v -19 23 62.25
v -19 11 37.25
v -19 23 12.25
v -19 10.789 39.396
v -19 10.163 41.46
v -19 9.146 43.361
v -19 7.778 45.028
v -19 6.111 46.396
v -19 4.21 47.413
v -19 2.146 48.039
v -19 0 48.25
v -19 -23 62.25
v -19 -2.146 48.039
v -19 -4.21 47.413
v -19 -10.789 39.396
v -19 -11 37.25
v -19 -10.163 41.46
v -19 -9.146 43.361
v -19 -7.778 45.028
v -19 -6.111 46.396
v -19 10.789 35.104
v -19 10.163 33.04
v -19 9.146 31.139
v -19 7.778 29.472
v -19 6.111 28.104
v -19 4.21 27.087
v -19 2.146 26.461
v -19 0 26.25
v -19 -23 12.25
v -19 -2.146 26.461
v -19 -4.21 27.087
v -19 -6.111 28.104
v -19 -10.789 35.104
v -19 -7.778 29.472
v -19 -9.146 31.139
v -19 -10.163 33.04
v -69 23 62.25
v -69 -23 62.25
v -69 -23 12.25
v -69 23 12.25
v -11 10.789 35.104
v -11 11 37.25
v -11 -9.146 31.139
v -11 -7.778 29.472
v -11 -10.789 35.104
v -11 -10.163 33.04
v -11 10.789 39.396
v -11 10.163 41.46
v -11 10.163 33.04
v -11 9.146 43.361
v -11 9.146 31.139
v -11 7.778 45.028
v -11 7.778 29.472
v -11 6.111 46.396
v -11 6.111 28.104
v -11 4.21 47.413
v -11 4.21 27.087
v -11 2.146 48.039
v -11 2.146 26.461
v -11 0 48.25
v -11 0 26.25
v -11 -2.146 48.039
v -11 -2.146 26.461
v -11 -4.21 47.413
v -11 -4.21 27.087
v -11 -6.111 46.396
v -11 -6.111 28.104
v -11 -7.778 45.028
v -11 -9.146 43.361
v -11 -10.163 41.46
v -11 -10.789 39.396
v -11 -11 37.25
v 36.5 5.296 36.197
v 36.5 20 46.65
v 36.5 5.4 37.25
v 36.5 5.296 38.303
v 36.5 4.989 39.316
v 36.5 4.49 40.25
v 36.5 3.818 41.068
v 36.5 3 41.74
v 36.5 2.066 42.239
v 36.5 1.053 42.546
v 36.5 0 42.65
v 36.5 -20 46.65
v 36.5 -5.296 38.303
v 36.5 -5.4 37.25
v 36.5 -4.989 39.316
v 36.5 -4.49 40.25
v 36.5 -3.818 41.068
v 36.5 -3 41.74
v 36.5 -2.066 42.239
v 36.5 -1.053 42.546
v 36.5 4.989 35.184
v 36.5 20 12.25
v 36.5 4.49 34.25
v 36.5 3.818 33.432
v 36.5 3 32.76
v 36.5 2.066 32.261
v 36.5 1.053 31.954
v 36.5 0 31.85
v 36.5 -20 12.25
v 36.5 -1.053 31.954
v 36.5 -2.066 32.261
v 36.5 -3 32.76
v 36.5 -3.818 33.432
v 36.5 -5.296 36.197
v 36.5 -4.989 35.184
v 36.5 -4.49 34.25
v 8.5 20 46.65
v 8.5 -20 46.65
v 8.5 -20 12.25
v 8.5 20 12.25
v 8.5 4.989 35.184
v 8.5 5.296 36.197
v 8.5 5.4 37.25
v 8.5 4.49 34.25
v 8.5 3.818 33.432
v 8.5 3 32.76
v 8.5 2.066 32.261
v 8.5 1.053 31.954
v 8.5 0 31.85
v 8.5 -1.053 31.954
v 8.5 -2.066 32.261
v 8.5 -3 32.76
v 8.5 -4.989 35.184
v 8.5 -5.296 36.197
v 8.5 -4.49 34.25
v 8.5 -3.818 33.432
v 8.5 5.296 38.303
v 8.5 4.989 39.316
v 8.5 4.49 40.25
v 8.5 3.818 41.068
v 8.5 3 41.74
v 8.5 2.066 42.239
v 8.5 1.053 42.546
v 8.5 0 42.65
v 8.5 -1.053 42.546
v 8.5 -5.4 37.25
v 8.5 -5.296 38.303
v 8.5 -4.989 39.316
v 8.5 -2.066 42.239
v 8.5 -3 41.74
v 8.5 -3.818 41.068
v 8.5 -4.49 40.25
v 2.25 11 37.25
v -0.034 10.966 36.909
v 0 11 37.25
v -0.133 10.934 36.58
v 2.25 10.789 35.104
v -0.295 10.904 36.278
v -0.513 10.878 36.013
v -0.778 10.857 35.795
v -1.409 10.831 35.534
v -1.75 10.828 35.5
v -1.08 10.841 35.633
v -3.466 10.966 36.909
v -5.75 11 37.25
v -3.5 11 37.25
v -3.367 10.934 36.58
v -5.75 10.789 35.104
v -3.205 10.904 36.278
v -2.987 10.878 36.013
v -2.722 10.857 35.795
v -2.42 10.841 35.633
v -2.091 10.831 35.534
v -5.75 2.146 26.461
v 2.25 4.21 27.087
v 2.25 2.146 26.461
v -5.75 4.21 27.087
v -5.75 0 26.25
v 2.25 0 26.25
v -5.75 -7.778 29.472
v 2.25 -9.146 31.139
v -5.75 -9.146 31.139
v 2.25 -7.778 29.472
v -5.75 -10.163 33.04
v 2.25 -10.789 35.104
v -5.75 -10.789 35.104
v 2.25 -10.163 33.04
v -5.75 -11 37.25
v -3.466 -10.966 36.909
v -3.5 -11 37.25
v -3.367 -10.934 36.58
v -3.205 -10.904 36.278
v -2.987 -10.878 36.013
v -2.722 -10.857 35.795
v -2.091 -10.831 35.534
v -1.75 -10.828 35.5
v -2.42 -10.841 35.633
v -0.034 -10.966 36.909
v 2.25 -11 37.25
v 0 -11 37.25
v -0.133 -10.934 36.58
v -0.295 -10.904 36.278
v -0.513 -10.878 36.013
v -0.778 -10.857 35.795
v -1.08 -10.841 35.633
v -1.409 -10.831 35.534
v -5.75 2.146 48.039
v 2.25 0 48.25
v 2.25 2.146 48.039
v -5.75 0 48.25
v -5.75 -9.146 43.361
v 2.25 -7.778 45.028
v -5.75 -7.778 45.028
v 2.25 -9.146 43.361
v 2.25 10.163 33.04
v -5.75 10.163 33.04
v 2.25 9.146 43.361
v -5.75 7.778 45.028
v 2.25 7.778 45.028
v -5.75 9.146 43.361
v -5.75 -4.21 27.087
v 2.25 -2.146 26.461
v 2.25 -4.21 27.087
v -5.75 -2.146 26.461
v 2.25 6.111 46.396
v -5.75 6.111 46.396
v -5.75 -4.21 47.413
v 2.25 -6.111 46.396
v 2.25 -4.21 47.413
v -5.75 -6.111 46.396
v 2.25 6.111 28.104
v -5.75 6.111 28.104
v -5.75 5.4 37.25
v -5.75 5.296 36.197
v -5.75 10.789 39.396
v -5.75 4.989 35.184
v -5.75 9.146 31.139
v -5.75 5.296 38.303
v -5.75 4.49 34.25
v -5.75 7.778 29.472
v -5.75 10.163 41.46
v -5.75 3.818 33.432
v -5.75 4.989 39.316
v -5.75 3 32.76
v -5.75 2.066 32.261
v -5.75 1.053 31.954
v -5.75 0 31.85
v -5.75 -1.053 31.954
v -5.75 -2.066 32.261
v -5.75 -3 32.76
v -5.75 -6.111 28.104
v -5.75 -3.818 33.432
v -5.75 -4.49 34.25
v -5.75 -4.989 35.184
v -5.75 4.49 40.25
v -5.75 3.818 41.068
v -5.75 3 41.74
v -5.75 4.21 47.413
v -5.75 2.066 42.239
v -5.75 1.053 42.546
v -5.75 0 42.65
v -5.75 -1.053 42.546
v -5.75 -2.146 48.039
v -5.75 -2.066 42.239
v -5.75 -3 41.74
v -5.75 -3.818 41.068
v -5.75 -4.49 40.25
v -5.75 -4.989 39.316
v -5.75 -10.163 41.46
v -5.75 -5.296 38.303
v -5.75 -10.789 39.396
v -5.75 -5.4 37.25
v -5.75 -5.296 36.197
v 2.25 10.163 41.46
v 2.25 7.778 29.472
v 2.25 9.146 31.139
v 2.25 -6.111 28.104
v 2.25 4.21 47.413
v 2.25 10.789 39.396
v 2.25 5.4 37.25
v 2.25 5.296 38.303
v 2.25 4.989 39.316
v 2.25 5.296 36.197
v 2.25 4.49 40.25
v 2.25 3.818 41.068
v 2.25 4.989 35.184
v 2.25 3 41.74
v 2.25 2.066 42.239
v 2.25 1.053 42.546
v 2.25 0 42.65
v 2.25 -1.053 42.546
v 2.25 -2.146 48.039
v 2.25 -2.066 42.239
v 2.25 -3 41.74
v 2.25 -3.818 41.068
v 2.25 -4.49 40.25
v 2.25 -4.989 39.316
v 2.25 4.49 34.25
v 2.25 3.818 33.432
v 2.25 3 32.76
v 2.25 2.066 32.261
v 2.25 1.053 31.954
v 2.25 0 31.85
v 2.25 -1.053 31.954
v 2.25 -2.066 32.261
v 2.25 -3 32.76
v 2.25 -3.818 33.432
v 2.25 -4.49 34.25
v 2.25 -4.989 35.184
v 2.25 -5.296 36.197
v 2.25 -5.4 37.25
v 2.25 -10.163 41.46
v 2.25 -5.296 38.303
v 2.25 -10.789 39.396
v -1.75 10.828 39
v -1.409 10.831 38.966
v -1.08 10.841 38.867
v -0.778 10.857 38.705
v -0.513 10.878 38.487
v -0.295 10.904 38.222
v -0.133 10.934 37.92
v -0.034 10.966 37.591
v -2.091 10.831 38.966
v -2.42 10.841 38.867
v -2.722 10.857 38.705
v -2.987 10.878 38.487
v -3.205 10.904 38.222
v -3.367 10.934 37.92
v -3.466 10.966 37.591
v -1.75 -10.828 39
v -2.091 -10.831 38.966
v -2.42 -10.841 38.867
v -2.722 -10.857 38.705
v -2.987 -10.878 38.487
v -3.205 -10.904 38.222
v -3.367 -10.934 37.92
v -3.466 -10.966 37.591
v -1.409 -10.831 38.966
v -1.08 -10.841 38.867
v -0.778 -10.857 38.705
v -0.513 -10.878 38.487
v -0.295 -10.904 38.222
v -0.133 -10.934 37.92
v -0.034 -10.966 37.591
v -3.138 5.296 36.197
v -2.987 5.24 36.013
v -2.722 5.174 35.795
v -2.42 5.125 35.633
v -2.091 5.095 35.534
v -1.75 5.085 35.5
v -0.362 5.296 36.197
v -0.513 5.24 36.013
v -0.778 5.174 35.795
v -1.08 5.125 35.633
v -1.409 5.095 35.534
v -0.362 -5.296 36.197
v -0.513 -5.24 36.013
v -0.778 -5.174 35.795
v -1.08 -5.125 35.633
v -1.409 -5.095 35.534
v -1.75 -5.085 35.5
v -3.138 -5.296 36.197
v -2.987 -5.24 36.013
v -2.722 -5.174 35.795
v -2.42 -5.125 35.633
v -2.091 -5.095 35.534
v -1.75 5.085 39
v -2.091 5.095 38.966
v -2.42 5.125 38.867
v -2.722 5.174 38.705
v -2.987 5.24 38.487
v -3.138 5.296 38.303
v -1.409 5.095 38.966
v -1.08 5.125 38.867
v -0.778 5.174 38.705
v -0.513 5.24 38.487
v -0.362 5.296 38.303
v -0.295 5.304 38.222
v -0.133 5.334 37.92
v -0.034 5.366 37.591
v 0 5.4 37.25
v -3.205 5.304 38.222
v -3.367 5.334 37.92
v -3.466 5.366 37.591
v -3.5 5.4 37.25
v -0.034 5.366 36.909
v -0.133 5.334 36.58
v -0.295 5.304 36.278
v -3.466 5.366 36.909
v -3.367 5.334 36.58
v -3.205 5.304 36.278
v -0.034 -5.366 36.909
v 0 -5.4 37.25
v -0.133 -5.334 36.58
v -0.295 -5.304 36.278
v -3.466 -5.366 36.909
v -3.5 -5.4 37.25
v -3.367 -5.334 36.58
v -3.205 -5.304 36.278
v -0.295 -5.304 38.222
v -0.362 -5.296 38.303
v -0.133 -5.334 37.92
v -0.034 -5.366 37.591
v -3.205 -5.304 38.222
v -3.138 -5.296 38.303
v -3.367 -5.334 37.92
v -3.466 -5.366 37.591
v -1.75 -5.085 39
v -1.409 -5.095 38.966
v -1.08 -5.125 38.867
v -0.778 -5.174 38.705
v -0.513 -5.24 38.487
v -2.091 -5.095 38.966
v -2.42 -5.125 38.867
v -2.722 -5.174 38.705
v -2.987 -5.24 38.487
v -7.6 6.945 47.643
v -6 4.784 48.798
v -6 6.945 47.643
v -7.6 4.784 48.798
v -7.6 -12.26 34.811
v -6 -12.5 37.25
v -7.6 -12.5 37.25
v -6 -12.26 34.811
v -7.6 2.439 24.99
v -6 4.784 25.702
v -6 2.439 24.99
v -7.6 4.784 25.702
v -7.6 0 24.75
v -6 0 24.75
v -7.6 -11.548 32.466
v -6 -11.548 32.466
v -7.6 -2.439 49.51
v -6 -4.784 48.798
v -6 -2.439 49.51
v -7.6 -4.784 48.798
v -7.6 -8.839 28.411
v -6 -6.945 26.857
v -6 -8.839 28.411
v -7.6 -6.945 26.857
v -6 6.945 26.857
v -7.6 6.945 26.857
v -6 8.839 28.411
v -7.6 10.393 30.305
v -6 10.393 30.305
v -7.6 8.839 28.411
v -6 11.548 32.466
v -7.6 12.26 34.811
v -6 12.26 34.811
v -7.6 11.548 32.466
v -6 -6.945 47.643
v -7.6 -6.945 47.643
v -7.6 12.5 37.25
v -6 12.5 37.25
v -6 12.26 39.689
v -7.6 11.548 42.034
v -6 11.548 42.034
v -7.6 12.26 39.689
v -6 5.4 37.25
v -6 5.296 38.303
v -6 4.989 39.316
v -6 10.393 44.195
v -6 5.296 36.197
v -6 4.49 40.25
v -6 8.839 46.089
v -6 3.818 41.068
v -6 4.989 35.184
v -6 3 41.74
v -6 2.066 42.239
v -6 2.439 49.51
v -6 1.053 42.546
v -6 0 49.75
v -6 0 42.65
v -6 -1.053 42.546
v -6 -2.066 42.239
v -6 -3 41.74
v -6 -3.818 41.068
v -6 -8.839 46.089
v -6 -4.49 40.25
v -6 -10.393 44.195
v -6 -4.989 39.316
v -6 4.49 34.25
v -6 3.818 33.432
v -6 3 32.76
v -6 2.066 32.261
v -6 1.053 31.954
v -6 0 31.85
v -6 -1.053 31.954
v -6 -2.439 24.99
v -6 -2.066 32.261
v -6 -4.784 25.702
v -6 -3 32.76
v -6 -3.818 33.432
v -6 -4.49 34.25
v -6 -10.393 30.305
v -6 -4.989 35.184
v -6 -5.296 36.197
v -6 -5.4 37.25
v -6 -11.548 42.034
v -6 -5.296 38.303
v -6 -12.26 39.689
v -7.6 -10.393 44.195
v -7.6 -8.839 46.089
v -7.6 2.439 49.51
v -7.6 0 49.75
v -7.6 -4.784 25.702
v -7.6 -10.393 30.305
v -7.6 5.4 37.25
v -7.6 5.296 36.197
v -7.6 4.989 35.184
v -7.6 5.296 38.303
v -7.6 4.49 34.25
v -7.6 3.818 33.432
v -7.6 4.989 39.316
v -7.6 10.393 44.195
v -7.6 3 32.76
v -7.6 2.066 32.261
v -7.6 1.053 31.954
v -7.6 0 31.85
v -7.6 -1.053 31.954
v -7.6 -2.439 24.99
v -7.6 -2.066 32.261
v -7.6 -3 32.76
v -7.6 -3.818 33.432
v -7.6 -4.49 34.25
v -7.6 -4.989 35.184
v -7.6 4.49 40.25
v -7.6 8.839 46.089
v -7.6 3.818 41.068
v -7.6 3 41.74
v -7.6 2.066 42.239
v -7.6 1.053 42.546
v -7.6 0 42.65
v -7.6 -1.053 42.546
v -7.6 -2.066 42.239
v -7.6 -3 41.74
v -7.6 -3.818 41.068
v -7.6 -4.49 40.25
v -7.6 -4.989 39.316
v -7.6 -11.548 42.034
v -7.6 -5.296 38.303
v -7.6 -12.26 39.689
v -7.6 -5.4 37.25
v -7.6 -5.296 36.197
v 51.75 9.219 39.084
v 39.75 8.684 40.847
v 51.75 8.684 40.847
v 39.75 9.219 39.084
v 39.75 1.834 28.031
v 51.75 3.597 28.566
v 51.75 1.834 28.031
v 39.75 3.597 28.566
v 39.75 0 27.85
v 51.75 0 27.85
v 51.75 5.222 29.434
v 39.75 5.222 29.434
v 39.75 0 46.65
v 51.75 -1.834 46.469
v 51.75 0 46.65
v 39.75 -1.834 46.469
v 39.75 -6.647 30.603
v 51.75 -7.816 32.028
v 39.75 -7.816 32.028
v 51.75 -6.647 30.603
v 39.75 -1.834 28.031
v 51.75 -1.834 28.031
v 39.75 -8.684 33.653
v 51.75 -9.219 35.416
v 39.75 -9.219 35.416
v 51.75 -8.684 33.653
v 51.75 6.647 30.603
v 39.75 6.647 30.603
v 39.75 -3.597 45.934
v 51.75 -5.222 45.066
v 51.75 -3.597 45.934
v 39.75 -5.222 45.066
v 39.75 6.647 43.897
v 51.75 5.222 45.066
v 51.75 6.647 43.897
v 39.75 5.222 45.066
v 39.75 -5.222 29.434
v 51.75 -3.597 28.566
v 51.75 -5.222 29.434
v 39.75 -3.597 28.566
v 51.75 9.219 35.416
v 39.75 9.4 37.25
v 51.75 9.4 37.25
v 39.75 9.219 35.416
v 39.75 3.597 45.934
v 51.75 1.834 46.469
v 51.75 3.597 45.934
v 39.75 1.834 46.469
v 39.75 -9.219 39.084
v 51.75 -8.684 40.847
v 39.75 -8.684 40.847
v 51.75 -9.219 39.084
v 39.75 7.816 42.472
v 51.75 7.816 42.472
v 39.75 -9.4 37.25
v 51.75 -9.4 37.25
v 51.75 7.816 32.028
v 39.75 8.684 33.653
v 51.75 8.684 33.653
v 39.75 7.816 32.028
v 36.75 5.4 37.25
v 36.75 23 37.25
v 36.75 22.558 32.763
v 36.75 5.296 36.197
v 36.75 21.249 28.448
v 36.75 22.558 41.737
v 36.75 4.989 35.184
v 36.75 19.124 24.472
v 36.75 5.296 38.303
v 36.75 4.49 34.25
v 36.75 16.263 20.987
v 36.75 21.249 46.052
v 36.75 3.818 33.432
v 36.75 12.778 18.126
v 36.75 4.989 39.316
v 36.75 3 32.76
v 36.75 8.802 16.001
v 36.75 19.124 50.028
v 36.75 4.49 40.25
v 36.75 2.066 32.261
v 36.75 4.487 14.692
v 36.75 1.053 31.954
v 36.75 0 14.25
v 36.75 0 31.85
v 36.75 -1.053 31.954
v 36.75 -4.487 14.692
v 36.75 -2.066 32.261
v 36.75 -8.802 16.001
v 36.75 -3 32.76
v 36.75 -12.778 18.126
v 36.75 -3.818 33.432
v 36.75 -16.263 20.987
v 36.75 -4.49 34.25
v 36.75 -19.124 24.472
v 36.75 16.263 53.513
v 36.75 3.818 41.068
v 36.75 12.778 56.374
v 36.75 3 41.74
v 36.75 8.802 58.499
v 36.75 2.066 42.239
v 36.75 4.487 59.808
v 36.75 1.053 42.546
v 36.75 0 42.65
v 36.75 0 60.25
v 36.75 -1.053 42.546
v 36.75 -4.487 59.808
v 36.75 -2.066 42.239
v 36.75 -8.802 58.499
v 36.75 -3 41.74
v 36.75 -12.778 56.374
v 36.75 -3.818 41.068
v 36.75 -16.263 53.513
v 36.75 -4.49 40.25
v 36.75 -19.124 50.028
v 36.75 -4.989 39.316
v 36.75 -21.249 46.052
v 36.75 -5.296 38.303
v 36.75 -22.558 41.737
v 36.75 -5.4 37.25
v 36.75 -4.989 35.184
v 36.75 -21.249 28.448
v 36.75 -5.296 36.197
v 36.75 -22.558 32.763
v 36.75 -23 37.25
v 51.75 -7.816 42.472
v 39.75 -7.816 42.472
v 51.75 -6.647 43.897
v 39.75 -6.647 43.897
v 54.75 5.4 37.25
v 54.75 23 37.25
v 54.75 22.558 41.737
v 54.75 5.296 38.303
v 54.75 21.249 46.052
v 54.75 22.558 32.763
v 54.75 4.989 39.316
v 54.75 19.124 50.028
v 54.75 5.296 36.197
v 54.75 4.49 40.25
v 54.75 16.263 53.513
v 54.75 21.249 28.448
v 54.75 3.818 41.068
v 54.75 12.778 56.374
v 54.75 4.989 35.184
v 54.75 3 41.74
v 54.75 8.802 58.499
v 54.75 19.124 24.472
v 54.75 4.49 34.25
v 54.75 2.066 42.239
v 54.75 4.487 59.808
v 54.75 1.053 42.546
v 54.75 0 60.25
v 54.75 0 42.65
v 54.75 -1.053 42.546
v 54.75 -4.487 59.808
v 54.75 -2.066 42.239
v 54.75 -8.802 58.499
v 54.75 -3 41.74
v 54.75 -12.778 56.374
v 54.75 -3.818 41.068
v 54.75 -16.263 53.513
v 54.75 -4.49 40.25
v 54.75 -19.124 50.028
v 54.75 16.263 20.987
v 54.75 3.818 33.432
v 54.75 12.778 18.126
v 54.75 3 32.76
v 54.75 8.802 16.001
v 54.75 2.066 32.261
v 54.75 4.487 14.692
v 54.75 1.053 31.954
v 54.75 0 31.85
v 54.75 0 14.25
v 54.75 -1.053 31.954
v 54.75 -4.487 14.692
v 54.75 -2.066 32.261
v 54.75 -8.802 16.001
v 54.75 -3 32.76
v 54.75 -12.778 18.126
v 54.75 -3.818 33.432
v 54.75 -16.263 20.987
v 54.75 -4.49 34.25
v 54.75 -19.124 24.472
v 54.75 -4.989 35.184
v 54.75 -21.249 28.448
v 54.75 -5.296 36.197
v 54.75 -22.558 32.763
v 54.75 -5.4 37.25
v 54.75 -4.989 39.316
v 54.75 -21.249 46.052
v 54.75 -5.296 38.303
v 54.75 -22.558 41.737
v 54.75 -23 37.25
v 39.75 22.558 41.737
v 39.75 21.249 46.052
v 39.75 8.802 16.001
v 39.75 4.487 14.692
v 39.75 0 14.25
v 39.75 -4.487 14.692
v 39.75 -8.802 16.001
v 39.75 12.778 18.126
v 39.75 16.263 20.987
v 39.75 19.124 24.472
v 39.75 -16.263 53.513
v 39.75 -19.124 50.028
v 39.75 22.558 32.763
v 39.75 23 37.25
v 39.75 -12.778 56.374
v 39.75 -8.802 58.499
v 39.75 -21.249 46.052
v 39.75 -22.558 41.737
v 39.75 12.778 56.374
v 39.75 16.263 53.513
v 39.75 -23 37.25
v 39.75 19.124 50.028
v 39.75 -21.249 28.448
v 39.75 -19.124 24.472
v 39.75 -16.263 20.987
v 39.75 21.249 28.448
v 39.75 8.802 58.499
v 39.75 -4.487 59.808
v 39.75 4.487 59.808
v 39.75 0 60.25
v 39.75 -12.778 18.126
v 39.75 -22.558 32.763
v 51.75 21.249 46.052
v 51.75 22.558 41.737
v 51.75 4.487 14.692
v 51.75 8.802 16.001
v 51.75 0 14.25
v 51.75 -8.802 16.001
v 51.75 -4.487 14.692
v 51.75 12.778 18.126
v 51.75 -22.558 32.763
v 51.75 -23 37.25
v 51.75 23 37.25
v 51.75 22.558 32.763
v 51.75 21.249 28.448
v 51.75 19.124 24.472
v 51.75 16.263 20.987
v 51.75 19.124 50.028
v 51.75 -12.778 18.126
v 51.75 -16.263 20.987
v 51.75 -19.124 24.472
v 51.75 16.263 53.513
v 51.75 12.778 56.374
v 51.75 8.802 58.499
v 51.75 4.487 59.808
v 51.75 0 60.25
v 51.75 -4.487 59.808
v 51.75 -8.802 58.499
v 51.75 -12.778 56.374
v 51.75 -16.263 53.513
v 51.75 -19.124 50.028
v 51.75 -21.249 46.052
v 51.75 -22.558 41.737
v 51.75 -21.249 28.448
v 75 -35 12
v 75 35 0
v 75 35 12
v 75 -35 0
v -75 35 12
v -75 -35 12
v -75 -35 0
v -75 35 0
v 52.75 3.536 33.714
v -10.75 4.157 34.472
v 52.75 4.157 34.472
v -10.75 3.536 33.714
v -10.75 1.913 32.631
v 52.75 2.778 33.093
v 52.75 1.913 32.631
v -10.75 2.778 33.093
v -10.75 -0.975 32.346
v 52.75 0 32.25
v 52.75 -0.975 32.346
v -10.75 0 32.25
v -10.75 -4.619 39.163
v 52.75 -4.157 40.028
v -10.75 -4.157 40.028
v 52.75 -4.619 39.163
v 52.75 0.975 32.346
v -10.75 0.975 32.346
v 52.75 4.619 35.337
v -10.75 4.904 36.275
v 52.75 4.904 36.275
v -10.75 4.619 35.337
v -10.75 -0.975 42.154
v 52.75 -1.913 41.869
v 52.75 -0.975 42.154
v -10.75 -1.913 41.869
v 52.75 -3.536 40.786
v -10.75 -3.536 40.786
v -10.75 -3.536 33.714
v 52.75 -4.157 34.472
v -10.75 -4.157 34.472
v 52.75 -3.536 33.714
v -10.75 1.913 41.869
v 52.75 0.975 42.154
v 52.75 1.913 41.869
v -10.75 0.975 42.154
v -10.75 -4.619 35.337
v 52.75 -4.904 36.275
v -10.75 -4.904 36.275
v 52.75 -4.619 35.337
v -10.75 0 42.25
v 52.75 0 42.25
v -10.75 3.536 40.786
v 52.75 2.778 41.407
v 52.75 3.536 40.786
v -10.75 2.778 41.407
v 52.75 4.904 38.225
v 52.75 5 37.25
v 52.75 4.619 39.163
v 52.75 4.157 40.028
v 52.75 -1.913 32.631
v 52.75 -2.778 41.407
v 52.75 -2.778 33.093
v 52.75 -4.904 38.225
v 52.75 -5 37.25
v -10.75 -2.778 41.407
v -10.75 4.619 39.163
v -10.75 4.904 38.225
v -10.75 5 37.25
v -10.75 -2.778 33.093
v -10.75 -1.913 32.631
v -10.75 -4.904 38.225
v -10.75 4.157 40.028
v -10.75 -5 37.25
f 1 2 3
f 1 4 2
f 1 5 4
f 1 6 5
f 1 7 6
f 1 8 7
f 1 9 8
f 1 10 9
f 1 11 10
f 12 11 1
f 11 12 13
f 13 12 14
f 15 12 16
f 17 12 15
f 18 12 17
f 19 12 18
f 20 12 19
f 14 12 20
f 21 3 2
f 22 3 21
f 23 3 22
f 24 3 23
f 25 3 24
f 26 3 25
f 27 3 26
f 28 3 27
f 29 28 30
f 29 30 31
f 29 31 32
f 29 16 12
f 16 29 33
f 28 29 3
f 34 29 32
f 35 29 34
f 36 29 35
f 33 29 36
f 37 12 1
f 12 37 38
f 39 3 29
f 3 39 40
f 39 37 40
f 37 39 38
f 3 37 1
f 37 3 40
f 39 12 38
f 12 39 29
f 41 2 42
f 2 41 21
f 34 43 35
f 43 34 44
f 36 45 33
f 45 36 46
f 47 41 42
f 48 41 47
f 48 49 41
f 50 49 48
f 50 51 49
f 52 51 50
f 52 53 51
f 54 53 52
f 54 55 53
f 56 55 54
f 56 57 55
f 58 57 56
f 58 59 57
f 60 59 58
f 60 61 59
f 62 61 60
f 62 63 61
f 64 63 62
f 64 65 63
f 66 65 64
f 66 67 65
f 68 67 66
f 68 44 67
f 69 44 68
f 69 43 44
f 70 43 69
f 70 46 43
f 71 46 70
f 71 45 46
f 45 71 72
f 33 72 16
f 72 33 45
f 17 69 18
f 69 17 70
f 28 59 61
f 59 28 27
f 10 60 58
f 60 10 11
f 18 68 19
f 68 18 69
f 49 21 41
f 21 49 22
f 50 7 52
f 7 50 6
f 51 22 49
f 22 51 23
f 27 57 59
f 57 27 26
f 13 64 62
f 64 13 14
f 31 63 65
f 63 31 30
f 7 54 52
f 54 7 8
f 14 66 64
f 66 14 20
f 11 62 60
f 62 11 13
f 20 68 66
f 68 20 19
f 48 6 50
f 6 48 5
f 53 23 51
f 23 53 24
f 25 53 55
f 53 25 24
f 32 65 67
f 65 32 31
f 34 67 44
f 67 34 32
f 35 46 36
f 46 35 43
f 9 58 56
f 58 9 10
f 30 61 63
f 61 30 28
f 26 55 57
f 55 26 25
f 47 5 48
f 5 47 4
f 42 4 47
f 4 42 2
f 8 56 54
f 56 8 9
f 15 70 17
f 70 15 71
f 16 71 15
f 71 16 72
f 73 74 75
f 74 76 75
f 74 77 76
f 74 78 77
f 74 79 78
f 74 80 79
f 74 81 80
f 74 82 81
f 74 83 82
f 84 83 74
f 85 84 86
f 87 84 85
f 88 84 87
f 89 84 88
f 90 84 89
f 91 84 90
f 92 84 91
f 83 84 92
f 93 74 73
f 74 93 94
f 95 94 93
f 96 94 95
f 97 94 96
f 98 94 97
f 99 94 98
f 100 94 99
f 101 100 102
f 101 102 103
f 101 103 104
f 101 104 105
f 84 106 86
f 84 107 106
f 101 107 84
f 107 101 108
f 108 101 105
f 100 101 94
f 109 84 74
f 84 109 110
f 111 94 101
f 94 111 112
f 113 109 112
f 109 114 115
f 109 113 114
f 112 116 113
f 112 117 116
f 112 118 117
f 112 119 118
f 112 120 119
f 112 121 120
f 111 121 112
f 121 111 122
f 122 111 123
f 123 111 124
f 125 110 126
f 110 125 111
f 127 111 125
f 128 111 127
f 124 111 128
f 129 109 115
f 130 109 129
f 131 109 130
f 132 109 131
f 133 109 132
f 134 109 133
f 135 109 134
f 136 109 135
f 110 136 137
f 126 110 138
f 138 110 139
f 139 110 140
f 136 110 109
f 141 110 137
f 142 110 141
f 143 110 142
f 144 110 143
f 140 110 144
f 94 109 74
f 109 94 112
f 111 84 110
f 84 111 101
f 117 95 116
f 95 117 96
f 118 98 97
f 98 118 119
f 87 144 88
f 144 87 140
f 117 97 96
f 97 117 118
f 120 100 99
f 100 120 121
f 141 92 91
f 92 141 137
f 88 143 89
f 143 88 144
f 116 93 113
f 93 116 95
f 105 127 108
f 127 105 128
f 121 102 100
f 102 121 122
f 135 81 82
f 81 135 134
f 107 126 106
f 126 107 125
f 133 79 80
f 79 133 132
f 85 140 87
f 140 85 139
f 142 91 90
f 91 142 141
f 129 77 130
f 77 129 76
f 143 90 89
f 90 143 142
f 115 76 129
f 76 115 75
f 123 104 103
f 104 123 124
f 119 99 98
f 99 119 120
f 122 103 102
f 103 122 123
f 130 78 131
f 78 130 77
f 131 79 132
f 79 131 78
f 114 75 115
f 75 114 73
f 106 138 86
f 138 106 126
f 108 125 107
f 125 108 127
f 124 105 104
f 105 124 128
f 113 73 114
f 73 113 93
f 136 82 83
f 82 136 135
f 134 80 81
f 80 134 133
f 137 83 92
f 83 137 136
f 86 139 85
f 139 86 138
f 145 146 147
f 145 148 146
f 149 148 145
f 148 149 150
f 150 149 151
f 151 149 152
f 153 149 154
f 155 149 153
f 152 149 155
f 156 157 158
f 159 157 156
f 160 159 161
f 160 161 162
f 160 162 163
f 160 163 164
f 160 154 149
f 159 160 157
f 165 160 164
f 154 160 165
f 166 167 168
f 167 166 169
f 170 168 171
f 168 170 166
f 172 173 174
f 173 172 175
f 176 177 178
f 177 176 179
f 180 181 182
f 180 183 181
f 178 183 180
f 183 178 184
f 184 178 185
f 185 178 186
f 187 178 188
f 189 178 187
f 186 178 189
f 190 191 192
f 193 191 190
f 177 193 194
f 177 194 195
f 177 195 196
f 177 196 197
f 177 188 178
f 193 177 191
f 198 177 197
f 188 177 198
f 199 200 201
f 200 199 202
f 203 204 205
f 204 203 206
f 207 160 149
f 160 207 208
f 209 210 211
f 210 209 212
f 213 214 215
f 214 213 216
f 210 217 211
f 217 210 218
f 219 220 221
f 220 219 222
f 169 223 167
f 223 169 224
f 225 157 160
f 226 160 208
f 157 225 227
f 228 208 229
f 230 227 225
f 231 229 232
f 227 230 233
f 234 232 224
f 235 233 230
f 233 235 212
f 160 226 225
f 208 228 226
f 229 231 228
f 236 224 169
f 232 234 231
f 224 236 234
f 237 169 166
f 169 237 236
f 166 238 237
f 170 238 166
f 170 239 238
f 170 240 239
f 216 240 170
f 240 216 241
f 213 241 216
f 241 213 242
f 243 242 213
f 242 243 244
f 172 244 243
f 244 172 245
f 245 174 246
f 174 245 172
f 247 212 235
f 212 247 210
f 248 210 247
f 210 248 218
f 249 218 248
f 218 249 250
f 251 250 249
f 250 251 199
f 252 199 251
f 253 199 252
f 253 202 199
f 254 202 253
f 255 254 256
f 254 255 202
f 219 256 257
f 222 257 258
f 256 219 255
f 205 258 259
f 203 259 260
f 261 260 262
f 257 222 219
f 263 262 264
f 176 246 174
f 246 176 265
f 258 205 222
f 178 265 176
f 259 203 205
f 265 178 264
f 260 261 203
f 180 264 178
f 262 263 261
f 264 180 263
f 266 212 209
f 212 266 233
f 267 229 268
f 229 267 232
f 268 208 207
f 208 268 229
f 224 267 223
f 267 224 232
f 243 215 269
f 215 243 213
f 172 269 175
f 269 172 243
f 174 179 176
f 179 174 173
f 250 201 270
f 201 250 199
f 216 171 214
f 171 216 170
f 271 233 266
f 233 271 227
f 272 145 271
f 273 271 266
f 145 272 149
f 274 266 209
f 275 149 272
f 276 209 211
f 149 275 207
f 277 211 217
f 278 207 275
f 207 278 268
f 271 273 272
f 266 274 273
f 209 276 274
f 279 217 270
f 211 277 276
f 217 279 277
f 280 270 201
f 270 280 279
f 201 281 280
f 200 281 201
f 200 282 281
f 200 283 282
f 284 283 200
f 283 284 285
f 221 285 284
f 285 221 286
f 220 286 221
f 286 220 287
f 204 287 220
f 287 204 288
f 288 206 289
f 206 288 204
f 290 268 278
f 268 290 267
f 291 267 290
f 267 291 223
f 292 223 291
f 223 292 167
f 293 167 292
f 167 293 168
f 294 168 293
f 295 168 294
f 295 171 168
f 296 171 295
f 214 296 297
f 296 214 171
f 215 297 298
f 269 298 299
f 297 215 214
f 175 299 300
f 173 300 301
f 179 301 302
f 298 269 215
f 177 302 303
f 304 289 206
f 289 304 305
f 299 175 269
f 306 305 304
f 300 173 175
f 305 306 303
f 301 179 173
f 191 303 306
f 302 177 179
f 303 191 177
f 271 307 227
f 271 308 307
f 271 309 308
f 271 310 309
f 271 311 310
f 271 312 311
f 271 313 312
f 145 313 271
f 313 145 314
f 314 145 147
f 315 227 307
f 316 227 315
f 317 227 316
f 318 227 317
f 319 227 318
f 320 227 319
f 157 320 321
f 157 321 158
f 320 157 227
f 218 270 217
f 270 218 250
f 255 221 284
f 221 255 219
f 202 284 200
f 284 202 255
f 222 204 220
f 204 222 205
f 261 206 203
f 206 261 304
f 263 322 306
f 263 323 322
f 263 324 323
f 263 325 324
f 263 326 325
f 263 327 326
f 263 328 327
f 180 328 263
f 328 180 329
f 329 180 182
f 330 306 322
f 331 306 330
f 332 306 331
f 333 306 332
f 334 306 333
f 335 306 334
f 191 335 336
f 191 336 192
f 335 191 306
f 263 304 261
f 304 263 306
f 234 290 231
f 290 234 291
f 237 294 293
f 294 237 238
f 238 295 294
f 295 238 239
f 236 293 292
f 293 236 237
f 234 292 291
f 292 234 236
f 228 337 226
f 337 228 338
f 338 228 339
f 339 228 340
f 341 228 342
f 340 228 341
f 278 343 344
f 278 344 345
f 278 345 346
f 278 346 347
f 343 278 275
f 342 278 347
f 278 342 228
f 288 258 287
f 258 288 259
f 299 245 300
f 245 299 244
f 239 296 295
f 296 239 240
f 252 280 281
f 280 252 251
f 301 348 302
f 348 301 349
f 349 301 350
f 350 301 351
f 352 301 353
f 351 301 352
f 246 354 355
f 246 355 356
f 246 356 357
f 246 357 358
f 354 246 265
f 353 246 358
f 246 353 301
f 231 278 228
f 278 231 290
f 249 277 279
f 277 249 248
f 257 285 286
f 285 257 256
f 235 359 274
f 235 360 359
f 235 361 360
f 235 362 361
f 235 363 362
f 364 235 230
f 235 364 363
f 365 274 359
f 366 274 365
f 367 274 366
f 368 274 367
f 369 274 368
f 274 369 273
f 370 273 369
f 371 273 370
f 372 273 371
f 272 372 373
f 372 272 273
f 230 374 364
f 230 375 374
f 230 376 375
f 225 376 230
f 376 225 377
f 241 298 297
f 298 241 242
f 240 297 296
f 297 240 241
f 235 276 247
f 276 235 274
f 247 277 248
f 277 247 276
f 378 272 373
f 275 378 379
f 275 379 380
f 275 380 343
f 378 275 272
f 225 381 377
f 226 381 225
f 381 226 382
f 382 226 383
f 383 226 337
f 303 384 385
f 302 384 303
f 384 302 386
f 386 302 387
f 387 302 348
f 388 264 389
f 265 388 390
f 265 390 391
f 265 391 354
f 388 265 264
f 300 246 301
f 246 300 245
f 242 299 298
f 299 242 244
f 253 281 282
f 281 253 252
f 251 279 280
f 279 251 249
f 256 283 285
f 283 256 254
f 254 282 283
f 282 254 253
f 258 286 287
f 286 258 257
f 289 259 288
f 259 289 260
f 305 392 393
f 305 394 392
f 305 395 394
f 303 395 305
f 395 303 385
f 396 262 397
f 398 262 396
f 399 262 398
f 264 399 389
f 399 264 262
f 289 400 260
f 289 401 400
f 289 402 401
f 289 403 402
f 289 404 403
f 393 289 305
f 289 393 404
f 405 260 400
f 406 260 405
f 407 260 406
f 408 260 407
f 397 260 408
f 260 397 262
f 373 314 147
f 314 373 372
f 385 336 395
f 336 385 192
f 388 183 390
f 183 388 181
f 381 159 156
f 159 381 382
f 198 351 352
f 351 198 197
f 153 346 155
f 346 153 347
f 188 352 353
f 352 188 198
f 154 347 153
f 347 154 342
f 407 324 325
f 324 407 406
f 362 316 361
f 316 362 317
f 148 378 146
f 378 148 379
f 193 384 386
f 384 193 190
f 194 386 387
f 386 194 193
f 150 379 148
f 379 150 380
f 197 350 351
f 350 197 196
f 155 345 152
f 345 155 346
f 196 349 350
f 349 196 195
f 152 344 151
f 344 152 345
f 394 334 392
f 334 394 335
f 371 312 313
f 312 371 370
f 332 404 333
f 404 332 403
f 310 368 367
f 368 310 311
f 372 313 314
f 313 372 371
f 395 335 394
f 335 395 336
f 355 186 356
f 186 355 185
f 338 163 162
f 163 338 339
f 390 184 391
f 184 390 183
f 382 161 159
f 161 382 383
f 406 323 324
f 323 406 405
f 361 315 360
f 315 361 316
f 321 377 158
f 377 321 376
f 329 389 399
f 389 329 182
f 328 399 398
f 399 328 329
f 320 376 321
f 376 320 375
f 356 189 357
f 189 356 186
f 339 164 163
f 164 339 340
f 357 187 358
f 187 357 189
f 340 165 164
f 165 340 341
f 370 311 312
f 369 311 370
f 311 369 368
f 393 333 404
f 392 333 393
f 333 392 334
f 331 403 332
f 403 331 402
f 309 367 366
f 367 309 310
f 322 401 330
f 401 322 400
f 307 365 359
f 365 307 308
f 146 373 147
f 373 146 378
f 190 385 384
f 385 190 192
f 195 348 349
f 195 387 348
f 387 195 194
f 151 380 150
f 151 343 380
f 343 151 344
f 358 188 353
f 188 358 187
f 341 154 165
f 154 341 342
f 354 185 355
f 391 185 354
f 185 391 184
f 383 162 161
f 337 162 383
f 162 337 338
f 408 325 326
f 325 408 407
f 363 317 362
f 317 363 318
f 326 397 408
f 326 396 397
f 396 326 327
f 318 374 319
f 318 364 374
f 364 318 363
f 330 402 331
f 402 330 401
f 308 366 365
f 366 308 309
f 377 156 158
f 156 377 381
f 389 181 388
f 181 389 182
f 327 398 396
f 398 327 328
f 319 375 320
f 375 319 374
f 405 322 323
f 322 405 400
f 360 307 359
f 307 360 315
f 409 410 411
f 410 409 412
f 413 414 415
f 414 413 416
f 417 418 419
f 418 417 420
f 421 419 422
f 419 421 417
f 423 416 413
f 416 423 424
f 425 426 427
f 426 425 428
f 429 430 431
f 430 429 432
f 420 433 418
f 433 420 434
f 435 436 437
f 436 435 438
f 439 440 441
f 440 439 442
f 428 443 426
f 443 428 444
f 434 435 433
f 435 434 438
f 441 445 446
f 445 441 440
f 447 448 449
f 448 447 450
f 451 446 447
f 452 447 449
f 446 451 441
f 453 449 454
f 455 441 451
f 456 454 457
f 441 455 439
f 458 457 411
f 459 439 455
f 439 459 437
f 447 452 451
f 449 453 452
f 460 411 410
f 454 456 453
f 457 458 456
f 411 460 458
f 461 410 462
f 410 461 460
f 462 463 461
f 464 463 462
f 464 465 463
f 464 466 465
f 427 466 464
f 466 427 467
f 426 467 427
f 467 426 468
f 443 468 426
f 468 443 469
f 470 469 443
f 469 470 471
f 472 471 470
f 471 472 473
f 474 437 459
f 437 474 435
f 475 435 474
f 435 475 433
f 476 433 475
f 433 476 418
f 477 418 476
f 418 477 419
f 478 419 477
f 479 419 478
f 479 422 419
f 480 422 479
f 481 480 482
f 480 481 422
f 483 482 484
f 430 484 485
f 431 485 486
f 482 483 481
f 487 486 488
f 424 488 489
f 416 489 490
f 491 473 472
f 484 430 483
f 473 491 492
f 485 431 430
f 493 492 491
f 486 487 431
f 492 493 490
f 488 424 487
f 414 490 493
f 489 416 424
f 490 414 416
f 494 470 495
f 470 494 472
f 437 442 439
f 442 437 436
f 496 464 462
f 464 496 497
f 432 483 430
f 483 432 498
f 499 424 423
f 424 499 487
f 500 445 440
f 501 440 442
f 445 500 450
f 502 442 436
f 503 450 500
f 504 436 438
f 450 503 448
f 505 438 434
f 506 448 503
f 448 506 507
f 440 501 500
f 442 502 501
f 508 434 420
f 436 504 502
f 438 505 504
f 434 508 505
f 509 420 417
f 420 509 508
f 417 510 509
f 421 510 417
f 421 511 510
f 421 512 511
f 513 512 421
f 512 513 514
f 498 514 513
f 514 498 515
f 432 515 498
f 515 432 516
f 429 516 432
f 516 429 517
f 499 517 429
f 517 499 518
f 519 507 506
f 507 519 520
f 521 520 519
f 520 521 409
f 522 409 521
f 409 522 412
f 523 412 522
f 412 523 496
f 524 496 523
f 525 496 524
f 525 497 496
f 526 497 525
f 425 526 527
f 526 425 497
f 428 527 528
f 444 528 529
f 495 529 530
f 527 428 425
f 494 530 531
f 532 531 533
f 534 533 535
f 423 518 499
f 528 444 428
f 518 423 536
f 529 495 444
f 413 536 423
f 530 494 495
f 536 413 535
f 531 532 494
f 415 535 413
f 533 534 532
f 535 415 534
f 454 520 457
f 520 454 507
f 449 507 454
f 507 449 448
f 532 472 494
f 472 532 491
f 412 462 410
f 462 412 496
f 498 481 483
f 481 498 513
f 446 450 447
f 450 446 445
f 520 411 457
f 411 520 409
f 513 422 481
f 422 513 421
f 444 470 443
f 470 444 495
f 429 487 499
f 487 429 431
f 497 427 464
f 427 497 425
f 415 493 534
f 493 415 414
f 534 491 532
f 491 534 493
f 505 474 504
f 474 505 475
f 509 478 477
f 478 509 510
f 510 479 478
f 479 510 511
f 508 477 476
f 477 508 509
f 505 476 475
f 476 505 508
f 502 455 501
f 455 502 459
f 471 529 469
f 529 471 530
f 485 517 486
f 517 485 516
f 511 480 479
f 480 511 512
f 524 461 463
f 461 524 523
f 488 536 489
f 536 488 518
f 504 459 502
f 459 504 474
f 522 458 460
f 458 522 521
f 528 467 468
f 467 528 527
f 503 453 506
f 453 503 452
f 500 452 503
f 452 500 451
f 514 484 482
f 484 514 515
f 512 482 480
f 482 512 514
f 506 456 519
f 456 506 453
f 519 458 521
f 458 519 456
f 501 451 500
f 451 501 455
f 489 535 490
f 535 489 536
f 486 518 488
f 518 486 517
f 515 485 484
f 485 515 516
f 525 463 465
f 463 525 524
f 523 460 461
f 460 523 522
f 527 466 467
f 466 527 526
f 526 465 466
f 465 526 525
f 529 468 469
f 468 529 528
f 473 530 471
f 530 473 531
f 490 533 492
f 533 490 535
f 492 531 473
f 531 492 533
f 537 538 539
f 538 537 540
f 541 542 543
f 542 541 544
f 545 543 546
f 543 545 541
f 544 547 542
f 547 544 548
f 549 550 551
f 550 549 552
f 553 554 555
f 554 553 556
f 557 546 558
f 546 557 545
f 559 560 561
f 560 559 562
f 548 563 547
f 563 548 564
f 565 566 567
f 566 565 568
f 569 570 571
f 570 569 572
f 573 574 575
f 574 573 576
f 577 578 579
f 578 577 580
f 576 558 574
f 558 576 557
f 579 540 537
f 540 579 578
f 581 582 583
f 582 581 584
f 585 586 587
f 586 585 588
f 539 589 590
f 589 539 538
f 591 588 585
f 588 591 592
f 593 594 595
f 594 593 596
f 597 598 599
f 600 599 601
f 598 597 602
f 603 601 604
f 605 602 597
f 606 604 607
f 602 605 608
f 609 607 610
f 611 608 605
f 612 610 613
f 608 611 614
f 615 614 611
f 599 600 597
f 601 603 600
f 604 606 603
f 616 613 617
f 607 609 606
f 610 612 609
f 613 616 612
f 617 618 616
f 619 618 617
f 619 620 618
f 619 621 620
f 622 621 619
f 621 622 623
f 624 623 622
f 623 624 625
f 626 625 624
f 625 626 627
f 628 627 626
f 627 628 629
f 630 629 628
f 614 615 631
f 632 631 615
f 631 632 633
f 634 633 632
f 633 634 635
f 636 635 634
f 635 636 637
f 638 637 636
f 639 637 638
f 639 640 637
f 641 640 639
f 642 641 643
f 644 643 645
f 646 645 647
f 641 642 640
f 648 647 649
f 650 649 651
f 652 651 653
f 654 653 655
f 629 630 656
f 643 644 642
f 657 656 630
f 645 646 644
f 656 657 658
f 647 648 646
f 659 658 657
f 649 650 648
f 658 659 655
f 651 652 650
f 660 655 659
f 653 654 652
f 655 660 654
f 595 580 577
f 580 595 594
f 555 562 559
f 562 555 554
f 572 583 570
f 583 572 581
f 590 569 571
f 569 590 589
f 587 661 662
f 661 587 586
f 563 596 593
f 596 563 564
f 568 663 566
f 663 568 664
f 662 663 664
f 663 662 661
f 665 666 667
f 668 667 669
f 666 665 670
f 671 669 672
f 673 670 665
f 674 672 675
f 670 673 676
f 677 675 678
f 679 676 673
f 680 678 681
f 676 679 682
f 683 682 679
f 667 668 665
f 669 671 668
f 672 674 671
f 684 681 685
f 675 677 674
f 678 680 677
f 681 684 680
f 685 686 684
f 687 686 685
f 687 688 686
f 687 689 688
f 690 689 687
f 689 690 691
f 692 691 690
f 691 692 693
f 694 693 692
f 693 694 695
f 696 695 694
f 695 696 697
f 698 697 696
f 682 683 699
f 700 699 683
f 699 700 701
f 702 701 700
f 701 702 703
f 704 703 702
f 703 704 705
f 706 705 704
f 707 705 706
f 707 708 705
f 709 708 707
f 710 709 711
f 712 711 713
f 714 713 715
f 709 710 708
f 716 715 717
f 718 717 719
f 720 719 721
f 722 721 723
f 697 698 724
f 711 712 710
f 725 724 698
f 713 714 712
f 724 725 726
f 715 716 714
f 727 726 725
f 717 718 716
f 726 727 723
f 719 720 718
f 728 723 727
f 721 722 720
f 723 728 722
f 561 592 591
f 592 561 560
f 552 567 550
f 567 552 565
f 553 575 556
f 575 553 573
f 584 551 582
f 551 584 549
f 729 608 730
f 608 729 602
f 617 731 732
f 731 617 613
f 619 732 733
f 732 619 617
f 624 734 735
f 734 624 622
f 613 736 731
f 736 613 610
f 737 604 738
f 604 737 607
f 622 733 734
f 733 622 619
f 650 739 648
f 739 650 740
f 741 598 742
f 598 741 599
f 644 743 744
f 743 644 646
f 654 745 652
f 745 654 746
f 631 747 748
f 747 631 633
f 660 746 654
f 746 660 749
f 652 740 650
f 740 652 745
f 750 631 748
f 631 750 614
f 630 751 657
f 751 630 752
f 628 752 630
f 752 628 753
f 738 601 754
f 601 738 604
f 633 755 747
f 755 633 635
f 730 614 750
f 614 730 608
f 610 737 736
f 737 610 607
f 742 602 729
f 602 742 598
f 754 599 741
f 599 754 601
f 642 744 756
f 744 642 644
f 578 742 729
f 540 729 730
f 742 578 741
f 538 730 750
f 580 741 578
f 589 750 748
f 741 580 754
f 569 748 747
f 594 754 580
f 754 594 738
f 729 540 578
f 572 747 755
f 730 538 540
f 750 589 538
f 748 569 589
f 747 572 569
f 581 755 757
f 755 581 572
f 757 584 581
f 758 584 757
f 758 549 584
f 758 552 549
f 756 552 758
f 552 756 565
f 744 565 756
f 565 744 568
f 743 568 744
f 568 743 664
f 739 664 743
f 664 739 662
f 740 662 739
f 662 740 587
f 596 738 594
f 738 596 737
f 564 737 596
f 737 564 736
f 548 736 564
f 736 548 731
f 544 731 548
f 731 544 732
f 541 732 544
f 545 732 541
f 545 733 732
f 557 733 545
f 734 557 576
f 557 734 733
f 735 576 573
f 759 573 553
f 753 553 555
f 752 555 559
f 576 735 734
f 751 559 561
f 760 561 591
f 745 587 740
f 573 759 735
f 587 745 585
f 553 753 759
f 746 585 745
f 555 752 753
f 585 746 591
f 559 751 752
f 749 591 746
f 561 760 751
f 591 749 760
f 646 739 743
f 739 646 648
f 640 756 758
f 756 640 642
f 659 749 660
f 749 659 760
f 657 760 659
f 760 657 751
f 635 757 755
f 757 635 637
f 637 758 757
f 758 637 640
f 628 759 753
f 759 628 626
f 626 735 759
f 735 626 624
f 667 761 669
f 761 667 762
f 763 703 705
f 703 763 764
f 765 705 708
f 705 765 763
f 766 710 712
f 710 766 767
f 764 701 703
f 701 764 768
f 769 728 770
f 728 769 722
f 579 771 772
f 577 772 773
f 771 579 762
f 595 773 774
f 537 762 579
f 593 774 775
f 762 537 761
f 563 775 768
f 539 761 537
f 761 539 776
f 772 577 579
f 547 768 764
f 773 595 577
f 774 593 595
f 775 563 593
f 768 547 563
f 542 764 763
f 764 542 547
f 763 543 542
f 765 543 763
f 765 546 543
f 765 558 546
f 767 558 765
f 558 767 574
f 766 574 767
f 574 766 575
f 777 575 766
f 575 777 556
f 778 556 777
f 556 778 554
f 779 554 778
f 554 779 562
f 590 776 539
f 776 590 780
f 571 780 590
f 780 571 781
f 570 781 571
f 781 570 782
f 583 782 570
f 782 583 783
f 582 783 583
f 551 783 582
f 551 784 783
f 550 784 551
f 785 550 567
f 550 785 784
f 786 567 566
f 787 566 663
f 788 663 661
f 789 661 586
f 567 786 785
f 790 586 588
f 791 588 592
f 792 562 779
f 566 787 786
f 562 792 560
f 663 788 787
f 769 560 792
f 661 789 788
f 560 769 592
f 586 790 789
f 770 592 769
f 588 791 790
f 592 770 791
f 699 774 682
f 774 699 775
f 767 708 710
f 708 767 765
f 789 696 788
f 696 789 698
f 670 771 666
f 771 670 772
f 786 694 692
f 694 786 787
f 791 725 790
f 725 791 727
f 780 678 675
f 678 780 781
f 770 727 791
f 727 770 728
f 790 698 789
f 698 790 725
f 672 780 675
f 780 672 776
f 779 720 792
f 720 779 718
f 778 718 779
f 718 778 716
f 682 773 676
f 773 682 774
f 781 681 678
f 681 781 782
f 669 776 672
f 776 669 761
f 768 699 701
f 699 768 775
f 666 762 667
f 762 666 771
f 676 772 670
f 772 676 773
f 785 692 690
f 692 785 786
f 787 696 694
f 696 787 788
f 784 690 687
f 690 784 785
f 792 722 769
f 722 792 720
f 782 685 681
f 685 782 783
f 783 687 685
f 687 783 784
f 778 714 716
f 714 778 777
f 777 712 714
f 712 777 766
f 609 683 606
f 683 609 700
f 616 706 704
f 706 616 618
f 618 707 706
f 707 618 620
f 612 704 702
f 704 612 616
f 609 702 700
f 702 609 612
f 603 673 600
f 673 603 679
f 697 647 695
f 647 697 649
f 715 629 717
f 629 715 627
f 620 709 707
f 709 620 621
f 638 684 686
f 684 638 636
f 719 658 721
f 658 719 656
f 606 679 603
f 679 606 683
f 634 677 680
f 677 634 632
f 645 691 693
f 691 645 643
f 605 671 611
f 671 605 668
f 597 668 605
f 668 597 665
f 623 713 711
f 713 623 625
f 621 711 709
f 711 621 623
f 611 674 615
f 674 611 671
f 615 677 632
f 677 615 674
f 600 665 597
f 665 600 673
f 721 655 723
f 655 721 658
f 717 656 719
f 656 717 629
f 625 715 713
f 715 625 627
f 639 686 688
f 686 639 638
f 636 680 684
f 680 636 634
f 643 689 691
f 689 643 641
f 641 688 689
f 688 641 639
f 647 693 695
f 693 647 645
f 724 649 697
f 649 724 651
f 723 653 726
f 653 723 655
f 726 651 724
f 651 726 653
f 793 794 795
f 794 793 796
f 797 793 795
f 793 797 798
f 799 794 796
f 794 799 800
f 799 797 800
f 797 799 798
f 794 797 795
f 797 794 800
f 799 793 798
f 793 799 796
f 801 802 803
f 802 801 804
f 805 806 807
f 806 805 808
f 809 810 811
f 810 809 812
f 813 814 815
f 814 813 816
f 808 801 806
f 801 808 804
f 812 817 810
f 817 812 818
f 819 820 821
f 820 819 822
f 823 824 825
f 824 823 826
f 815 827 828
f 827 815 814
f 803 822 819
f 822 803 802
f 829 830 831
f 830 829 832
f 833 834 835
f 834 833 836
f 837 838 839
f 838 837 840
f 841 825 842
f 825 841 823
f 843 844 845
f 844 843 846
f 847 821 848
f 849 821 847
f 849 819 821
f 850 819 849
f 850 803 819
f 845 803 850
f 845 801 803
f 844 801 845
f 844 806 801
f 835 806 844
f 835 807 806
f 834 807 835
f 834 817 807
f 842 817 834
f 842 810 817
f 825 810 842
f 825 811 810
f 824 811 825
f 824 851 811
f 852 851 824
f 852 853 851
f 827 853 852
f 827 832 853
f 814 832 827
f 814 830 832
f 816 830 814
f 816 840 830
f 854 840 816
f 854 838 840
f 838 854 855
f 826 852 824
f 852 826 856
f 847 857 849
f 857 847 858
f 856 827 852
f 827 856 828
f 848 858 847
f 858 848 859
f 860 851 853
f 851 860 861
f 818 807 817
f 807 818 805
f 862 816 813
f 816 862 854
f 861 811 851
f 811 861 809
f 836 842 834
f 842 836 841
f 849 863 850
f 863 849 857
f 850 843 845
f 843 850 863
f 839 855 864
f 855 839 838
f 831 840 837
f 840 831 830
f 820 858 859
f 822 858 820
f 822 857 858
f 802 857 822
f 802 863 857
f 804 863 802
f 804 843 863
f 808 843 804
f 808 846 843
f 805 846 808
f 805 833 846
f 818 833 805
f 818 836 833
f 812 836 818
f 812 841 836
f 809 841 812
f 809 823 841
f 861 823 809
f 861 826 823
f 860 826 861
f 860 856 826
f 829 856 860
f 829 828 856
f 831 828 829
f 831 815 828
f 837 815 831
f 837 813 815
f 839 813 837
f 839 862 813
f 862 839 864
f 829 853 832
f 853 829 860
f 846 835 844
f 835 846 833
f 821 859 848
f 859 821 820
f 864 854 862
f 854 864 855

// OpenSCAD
$fn = 32;

// ------------------------------------------------------------------------
// Motor drive station: motor 50 x 50 mm, shaft d10, pulley d46
// Every part is its own module, assembly() places every instance.
// ------------------------------------------------------------------------

// --- part 1 ---
module station_bed() {
  difference() {
    translate([-75, -35, 0]) cube([150, 70, 12]);
  }
}

// --- part 2 ---
module drive_motor() {
  union() {
    translate([-25, -23, 0]) cube([50, 46, 50]);
    translate([29, 0, 25]) rotate([0, 90, 0]) cylinder(h = 8, d = 22, center = true);
  }
}

// --- part 3 ---
module pillow_block() {
  difference() {
    translate([-14, -20, 0]) cube([28, 40, 34.4]);
    translate([0, 0, 25]) rotate([0, 90, 0]) cylinder(h = 30, d = 10.8, center = true);
  }
}

// --- part 4 ---
module drive_shaft() {
  translate([0, 0, -31.75]) cylinder(h = 63.5, d = 10);
}

// --- part 5 ---
module shaft_collar() {
  difference() {
    cylinder(h = 8, d = 22);
    translate([0, 0, -1]) cylinder(h = 10, d = 10.8);
    translate([0, 0, 4]) rotate([90, 0, 0]) cylinder(h = 24, d = 3.5, center = true);
  }
}

// --- part 6 ---
module collar_washer() {
  difference() {
      translate([0, 0, 0]) cylinder(h = 1.6, d = 25);
      translate([0, 0, -1]) cylinder(h = 3.6, d = 10.8);
    }
}

// --- part 7 ---
module drive_pulley() {
  difference() {
    union() {
      cylinder(h = 18, d = 18.8);
      cylinder(h = 3, d = 46);
      translate([0, 0, 15]) cylinder(h = 3, d = 46);
    }
    translate([0, 0, -1]) cylinder(h = 20, d = 10.8);
  }
}

// --- assembly ---
module assembly() {
  color([0.80, 0.24, 0.20]) translate([0, 0, 0]) rotate([0, 0, 0]) station_bed();
  color([0.20, 0.45, 0.75]) translate([-44, 0, 12.25]) rotate([0, 0, 0]) drive_motor();
  color([0.25, 0.62, 0.32]) translate([22.5, 0, 12.25]) rotate([0, 0, 0]) pillow_block();
  color([0.92, 0.70, 0.18]) translate([21, 0, 37.25]) rotate([0, 90, 0]) drive_shaft();
  color([0.58, 0.35, 0.70]) translate([-5.75, 0, 37.25]) rotate([0, 90, 0]) shaft_collar();
  color([0.16, 0.66, 0.66]) translate([-7.6, 0, 37.25]) rotate([0, 90, 0]) collar_washer();
  color([0.85, 0.48, 0.18]) translate([36.75, 0, 37.25]) rotate([0, 90, 0]) drive_pulley();
}

assembly();
